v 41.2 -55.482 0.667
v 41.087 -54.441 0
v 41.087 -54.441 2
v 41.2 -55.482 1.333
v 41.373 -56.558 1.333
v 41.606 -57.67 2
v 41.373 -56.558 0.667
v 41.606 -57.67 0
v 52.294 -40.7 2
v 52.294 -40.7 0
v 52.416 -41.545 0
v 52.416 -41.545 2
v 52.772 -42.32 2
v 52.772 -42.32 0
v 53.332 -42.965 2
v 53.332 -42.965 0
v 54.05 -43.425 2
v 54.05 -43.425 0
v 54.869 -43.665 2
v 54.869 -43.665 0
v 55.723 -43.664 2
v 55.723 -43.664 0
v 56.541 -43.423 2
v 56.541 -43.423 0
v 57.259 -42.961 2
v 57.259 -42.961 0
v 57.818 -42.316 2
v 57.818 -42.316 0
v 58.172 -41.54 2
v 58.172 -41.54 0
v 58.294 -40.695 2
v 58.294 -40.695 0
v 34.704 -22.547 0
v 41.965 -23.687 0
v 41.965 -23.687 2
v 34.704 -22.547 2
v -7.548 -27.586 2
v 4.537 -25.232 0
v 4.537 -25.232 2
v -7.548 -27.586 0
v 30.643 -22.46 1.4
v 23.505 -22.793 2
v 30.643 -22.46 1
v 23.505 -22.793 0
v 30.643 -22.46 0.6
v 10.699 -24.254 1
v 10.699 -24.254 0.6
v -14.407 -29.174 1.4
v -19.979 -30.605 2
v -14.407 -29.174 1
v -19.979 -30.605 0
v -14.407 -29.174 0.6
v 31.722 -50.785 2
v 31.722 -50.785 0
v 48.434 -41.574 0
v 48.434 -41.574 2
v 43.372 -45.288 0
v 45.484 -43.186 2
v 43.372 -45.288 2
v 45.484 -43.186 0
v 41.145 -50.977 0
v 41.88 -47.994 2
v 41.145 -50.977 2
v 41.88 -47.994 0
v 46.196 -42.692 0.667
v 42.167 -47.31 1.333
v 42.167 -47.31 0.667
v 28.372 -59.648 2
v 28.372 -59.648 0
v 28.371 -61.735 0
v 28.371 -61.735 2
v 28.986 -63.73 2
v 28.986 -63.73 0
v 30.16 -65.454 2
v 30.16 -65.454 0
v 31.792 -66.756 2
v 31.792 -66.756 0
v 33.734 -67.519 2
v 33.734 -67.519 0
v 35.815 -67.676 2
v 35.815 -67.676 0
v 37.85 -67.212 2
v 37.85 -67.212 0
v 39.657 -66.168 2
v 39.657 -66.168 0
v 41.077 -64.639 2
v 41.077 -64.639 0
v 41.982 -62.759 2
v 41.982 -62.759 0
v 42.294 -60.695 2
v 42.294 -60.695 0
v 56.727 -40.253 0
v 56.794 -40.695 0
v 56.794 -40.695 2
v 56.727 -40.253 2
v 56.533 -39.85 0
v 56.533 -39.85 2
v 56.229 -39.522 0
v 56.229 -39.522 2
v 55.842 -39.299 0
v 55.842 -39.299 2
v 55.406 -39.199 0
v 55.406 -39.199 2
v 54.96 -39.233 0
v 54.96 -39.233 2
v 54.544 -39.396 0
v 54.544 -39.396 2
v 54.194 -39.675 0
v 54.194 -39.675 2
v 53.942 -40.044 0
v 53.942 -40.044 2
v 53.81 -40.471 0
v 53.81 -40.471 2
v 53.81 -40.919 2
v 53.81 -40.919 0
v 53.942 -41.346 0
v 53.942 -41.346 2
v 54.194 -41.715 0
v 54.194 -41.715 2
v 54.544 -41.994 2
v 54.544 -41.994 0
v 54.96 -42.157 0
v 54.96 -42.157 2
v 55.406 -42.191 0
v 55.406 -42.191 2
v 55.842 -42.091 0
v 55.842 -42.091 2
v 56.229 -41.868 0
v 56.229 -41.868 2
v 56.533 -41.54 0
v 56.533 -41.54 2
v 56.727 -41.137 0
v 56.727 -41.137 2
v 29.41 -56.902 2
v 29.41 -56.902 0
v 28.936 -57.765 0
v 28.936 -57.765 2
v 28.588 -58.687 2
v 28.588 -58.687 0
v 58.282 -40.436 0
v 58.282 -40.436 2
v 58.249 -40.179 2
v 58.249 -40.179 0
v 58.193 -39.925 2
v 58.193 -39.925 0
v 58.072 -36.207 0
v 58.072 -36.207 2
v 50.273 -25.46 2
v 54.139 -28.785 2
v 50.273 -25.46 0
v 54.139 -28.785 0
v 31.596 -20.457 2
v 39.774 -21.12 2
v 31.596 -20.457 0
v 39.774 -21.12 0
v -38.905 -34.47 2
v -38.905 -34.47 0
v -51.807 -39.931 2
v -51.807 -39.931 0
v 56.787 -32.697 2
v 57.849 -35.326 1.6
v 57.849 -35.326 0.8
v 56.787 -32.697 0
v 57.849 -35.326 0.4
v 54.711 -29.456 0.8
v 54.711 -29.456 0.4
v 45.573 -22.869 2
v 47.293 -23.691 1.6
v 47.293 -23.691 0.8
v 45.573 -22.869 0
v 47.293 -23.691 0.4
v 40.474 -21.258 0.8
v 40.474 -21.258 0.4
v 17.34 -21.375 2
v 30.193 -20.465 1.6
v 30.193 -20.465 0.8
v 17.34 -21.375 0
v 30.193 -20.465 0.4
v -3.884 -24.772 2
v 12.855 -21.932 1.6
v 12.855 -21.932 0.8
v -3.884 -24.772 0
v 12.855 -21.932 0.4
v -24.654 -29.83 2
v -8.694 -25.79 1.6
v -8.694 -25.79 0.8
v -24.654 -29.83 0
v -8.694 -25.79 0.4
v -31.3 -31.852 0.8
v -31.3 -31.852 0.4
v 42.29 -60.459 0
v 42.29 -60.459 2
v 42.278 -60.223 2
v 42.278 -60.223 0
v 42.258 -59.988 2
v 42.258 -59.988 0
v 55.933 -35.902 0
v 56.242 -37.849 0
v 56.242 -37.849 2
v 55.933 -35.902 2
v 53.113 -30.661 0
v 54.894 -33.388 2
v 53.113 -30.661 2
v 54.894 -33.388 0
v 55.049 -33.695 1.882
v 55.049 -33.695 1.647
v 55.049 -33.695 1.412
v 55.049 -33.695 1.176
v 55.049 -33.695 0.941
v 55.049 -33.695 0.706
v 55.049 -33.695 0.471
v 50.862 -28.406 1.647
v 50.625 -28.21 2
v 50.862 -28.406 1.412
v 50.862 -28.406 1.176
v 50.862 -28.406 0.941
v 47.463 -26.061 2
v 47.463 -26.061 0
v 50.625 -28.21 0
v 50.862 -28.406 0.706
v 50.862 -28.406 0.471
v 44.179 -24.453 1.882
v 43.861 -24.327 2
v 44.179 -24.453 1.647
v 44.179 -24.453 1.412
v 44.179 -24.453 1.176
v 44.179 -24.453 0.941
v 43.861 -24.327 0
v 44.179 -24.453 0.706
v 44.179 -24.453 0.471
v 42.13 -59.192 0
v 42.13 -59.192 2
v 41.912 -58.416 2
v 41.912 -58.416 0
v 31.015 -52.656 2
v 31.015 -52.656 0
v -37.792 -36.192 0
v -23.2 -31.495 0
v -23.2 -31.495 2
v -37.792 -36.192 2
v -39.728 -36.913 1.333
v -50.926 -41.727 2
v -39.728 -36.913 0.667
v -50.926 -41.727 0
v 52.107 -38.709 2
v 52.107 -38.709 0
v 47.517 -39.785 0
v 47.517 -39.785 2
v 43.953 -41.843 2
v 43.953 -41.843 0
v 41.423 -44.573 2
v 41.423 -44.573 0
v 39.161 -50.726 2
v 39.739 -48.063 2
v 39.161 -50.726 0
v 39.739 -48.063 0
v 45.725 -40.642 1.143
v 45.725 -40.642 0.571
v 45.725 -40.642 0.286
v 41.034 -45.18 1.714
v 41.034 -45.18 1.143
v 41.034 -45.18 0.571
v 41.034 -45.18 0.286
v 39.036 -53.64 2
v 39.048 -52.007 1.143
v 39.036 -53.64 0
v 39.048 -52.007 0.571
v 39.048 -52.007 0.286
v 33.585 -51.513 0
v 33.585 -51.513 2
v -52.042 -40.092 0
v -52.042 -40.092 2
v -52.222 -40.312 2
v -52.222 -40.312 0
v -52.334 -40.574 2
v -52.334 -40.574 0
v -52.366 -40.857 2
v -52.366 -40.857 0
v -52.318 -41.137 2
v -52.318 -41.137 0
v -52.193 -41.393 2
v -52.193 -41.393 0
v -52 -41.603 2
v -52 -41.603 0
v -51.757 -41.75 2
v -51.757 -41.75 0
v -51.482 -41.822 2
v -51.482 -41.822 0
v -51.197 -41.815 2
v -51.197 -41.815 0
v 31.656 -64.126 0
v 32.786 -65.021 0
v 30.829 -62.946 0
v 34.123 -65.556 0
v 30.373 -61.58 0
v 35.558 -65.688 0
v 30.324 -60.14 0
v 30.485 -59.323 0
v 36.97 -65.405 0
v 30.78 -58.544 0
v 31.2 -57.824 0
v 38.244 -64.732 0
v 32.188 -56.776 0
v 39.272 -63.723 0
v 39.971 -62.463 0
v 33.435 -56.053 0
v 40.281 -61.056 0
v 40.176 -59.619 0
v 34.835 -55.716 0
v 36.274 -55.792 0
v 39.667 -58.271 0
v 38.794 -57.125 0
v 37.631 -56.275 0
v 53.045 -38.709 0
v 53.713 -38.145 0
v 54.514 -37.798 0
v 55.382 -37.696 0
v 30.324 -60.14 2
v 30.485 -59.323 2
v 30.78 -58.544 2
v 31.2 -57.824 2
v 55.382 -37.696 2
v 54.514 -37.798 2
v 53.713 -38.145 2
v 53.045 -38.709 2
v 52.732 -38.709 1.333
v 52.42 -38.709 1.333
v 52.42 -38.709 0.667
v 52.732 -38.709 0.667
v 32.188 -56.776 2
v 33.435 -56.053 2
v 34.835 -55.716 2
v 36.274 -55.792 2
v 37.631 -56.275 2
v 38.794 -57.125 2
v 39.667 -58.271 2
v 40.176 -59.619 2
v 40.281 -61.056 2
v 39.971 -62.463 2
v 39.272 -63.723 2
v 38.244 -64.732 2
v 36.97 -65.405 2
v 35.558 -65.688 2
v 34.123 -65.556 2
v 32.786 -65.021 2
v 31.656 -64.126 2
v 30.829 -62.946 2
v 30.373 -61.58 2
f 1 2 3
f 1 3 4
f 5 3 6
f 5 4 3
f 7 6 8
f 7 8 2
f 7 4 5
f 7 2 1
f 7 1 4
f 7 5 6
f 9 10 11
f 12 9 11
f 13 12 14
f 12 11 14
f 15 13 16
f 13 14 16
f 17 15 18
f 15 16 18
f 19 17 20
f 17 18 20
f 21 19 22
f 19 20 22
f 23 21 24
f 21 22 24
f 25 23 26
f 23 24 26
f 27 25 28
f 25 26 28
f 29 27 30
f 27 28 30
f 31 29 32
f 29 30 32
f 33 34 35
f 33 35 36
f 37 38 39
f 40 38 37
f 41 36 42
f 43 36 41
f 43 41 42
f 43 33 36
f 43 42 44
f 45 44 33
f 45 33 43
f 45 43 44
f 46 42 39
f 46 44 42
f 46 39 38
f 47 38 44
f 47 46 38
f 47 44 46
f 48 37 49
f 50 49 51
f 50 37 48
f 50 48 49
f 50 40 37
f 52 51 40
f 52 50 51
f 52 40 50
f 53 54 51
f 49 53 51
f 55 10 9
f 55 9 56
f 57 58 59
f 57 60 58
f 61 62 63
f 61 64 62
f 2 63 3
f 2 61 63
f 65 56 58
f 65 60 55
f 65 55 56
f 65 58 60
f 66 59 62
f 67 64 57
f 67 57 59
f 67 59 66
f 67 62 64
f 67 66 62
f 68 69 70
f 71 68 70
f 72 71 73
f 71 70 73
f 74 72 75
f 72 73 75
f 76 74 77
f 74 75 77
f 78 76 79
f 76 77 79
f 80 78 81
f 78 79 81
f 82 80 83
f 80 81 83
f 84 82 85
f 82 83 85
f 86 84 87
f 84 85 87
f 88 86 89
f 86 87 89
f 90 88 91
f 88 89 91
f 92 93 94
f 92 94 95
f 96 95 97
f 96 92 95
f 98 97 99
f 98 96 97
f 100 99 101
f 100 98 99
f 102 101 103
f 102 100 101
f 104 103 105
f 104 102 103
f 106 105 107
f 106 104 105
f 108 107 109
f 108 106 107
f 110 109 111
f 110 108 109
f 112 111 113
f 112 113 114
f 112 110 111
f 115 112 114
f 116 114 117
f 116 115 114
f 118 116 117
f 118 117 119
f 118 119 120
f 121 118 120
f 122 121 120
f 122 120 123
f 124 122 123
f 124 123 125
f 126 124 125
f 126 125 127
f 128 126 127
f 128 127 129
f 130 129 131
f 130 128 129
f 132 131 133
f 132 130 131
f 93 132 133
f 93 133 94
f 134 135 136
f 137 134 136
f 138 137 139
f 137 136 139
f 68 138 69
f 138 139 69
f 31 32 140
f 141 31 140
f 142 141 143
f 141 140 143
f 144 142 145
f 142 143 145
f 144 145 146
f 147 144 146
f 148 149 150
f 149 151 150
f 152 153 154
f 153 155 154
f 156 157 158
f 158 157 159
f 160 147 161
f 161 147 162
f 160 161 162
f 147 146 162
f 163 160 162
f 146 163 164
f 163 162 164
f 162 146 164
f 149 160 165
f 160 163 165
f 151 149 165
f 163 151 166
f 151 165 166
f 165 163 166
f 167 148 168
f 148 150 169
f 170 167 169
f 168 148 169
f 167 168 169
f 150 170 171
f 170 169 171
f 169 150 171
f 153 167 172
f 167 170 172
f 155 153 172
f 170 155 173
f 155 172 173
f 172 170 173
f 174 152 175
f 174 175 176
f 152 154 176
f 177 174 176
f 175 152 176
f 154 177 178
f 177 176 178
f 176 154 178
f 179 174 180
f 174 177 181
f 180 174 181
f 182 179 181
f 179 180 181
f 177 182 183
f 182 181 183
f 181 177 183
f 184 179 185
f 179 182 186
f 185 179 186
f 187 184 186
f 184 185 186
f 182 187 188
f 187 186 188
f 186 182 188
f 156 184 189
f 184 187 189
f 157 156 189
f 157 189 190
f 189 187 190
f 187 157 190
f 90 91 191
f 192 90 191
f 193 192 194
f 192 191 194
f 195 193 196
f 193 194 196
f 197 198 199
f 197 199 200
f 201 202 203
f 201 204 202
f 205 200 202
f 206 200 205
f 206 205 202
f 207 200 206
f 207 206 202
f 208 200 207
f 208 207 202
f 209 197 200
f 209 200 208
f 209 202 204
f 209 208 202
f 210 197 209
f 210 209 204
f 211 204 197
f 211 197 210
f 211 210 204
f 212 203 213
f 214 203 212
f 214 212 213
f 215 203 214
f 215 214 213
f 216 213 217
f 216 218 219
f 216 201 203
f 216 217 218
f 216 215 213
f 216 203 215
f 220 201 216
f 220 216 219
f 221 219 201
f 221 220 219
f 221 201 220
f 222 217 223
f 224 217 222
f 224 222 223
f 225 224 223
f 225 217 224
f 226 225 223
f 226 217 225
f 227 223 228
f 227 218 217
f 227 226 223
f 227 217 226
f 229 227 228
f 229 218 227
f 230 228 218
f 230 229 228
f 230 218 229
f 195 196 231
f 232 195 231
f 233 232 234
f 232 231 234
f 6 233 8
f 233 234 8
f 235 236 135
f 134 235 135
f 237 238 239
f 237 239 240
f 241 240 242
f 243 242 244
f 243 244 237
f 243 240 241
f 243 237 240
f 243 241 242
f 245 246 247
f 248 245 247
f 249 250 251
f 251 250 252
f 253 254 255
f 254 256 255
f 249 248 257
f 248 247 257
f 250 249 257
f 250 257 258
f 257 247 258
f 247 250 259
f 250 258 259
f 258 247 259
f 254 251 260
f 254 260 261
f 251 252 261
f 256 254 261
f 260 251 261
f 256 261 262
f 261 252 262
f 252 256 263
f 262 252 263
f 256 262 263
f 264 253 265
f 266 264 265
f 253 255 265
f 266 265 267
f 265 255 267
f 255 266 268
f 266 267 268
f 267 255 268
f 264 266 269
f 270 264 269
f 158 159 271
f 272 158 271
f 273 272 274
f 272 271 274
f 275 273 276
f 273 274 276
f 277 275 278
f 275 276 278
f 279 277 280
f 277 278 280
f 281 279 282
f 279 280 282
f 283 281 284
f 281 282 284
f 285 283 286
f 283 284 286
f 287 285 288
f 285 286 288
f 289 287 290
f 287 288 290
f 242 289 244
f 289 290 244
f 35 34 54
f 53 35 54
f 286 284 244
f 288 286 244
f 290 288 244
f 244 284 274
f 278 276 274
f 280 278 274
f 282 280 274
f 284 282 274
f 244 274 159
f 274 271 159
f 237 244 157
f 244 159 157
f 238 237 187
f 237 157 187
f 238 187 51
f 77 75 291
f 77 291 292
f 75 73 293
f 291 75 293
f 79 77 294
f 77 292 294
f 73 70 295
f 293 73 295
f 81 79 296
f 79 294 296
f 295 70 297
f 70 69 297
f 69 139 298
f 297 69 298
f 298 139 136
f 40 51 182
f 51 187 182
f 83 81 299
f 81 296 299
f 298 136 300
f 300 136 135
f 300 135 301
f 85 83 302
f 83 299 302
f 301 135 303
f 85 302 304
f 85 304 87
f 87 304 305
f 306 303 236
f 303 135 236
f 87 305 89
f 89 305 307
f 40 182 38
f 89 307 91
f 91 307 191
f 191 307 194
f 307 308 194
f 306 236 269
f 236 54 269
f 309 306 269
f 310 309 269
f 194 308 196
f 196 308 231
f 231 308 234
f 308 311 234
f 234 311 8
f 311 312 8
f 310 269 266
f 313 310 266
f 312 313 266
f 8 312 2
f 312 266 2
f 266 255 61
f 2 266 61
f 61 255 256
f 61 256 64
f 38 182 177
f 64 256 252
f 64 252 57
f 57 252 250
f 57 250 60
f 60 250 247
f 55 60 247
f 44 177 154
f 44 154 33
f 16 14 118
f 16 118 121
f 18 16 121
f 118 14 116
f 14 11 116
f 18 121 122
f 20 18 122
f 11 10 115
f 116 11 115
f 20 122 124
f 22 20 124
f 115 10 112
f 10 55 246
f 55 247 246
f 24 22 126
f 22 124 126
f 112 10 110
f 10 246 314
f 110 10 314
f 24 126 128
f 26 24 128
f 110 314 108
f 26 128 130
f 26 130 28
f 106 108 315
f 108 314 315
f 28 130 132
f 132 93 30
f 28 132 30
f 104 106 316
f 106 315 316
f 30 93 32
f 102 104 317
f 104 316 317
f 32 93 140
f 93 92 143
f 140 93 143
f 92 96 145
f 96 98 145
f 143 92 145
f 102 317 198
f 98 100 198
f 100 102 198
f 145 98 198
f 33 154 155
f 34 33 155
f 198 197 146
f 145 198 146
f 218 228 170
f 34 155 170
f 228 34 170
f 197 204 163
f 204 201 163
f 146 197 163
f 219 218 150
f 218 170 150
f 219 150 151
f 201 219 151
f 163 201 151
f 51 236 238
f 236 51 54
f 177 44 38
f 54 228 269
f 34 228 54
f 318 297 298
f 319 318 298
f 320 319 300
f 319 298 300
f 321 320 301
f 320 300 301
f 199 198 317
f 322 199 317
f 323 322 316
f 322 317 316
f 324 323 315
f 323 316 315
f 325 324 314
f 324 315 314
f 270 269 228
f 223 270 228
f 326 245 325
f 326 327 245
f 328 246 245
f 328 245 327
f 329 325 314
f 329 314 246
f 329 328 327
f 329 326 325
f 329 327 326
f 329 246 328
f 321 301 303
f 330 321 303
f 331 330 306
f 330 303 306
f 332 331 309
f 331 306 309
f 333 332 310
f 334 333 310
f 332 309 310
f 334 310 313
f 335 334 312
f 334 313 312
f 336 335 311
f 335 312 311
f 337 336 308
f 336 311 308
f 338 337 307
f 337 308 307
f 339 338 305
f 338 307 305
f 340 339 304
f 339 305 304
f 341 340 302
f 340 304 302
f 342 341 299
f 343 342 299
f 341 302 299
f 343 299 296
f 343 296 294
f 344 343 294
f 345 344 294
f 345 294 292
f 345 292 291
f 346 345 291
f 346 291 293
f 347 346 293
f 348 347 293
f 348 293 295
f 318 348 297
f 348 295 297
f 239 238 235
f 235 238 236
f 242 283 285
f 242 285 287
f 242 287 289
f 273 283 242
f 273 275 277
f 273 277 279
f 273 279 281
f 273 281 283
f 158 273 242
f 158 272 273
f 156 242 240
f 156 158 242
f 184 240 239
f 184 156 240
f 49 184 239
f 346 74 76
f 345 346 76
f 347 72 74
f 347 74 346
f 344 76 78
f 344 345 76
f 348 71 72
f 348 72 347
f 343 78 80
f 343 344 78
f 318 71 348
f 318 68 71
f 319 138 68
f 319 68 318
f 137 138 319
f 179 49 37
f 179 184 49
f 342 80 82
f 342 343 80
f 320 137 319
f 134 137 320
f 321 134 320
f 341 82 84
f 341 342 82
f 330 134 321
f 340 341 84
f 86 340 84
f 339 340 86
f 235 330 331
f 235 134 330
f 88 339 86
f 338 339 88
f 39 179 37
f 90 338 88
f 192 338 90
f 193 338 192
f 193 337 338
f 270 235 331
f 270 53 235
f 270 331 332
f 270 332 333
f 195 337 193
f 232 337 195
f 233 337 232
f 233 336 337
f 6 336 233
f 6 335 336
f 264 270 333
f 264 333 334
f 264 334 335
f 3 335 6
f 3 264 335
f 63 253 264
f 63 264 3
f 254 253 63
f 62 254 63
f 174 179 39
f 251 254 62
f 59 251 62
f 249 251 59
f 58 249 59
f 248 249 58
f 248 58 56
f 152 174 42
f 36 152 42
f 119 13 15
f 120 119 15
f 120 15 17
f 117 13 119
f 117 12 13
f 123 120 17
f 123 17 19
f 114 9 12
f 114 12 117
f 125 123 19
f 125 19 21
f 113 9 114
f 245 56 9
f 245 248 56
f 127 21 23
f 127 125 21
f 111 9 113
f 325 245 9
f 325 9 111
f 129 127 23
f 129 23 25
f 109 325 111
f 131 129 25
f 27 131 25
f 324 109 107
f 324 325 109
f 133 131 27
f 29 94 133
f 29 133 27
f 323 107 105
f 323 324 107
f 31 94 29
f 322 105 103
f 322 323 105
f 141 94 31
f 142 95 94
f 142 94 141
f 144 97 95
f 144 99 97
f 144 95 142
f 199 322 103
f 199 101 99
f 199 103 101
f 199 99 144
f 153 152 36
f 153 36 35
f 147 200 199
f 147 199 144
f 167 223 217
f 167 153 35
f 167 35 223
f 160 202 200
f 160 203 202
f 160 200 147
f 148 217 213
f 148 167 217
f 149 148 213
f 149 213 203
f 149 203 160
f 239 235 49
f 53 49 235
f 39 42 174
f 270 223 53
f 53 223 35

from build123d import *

# Parameters (mm, degrees)
F0_R     = 1.5
F1_DEPTH = 2


# Not quite as in the source:
# - ends of sketch curves that miss each other by under 0.0002 mm in the source are joined
# - the dataset's text gives a spline's control points without its knots; the knots are read off the source's solid
# - a feature names something its author has since deleted; it is built from what else it names


with BuildPart() as f1:
    # F0 (on Top) → F1 (new body)
    with BuildSketch(Plane.XY):
        with BuildLine():
            ThreePointArc((52.2935542038, -40.6999699993), (55.2960408024, -43.6949874982), (58.293550068, -40.6949885322))
            ThreePointArc((58.293550068, -40.6949885322), (58.2683262446, -40.3067789254), (58.1930789354, -39.9250974055))
            ThreePointArc((58.1930789354, -39.9250974055), (57.4796767246, -38.6405177387), (56.2418257324, -37.8488027926))
            ThreePointArc((56.2418257324, -37.8488027926), (54.5142276657, -37.797980318), (53.0452934588, -38.7086999783))
            ThreePointArc((53.0452934588, -38.7086999783), (52.4868923439, -39.6354261603), (52.2935542038, -40.6999699993))
        make_face()
        with Locations((55.293550068, -40.6949885322)):
            Circle(F0_R, mode=Mode.SUBTRACT)
        with BuildLine():
            ThreePointArc((56.2418257324, -37.8488027926), (57.4796767246, -38.6405177387), (58.1930789354, -39.9250974055))
            add(Edge.make_bspline(
                [(58.1930789354, -39.9250974055), (58.3033130736, -37.7310082657), (58.2243494159, -35.5108400169), (55.0379759914, -28.7548025201), (48.9442417419, -24.2694887803), (44.3900033027, -22.3203597806), (42.6738912189, -21.8107824439)],
                knots=[0, 0, 0, 0, 0.1015612411, 0.2235800295, 0.3685390699, 0.4388199083, 0.4388199083, 0.4388199083, 0.4388199083], degree=3))
            Line((42.6738912189, -21.8107824439), (41.964733286, -23.686983414))
            add(Edge.make_bspline(
                [(43.8609833986, -24.3268333981), (43.3289424335, -24.1211020721), (42.7047021585, -23.9054209924), (42.0415249398, -23.7092758985), (41.964733286, -23.686983414)],
                knots=[0.4114771922, 0.4114771922, 0.4114771922, 0.4114771922, 0.4375, 0.4408809882, 0.4408809882, 0.4408809882, 0.4408809882], degree=3))
            add(Edge.make_bspline(
                [(56.2418257324, -37.8488027926), (56.2394213733, -37.7603227769), (56.2286503864, -37.4873658698), (56.1800365415, -36.9201590877), (56.069742607, -36.3538850938), (55.8543969217, -35.6321786342), (55.5678897973, -34.8258093362), (55.0817648726, -33.7070238451), (54.3034301535, -32.2914370705), (53.5048198591, -31.1313333662), (52.7839346376, -30.2592295206), (51.9942866252, -29.4080883353), (50.8900875481, -28.3917840446), (49.39835744, -27.2551920717), (48.0378091306, -26.3838599758), (46.892639081, -25.7358249791), (45.7132806304, -25.1200272482), (44.7078870744, -24.6607216085), (43.9678542796, -24.368158577), (43.8609833986, -24.3268333981)],
                knots=[0.0398594843, 0.0398594843, 0.0398594843, 0.0398594843, 0.046875, 0.0625, 0.09375, 0.109375, 0.125, 0.15625, 0.1875, 0.21875, 0.234375, 0.25, 0.28125, 0.3125, 0.34375, 0.359375, 0.375, 0.40625, 0.4114771922, 0.4114771922, 0.4114771922, 0.4114771922], degree=3))
        make_face()
        with BuildLine():
            add(Edge.make_bspline(
                [(52.2935542038, -40.6999699993), (45.456263492, -41.3409080355), (40.3978308424, -46.0921366862), (41.0869357168, -54.4406835786)],
                knots=[0, 0, 0, 0, 18.0622051912, 18.0622051912, 18.0622051912, 18.0622051912], degree=3))
            ThreePointArc((52.2935542038, -40.6999699993), (52.4868923439, -39.6354261603), (53.0452934588, -38.7086999783))
            add(Edge.make_bspline(
                [(52.1068895218, -38.7086999783), (52.4196908341, -38.7086999783), (52.7324921465, -38.7086999783), (53.0452934588, -38.7086999783)],
                knots=[0, 0, 0, 0, 0.938403937, 0.938403937, 0.938403937, 0.938403937], degree=3))
            add(Edge.make_bspline(
                [(52.1068895218, -38.7086999783), (50.9542029326, -38.8167545733), (48.7166922252, -39.2432467553), (45.656251664, -40.5314133508), (43.0085385627, -42.4829452683), (40.9177950005, -45.0828169643), (39.5222111221, -48.2640140254), (39.0301599925, -51.2150541571), (39.0166820966, -53.0841597893), (39.0364706431, -53.640353514)],
                knots=[0, 0, 0, 0, 0.125, 0.25, 0.375, 0.5, 0.625, 0.75, 0.8013710099, 0.8013710099, 0.8013710099, 0.8013710099], degree=3))
            Line((39.0364706431, -53.640353514), (41.0869357168, -54.4406835786))
        make_face()
        with BuildLine():
            Line((41.964733286, -23.686983414), (42.6738912189, -21.8107824439))
            add(Edge.make_bspline(
                [(42.6738912189, -21.8107824439), (39.5726178708, -20.8898993454), (22.5646670262, -18.6515577464), (-27.2658854571, -27.8972020005), (-51.8069210646, -39.9311738866)],
                knots=[0.4388199083, 0.4388199083, 0.4388199083, 0.4388199083, 0.5658279827, 1, 1, 1, 1], degree=3))
            ThreePointArc((-51.8069210646, -39.9311738866), (-52.2645064284, -41.2693127564), (-50.9263675587, -41.7268981202))
            add(Edge.make_bspline(
                [(-23.2001931383, -31.4948417187), (-24.5902934046, -31.8889224129), (-30.2586462024, -33.5514164099), (-39.9245924887, -36.8107053488), (-47.460158402, -40.0272036082), (-50.9263675587, -41.7268981202)],
                knots=[0.8548139109, 0.8548139109, 0.8548139109, 0.8548139109, 0.875, 0.9375, 1, 1, 1, 1], degree=3))
            add(Edge.make_bspline(
                [(-19.9786029715, -30.6053536552), (-21.0551466867, -30.8947880406), (-22.1295355043, -31.1913200851), (-23.2001931383, -31.4948417187)],
                knots=[0.8392665501, 0.8392665501, 0.8392665501, 0.8392665501, 0.8548139109, 0.8548139109, 0.8548139109, 0.8548139109], degree=3))
            add(Edge.make_bspline(
                [(41.964733286, -23.686983414), (41.3317504553, -23.503229591), (39.9116827451, -23.1510783719), (37.4071483832, -22.746096553), (34.3488873951, -22.4920963849), (30.7487168375, -22.424981715), (26.5130652723, -22.5659356176), (20.1107293403, -23.0314333909), (10.9126678715, -24.1239147624), (-1.4091965396, -26.2175832368), (-11.9228386138, -28.5154051855), (-18.1252105086, -30.1070594376), (-19.9786029715, -30.6053536552)],
                knots=[0.4408809882, 0.4408809882, 0.4408809882, 0.4408809882, 0.46875, 0.5, 0.53125, 0.5625, 0.59375, 0.625, 0.6875, 0.75, 0.8125, 0.8392665501, 0.8392665501, 0.8392665501, 0.8392665501], degree=3))
        make_face()
        with BuildLine():
            add(Edge.make_bspline(
                [(41.0869357168, -54.4406835786), (41.171365149, -55.4635512139), (41.3420723504, -56.5404191219), (41.6063564607, -57.670343851)],
                knots=[18.0622051912, 18.0622051912, 18.0622051912, 18.0622051912, 20.2751945115, 20.2751945115, 20.2751945115, 20.2751945115], degree=3))
            Line((41.0869357168, -54.4406835786), (39.0364758665, -53.6403401319))
            Line((39.0364758665, -53.6403401319), (33.5854085722, -51.5126583899))
            Line((33.5854085722, -51.5126583899), (32.8782428587, -53.383588596))
            Line((32.8782428587, -53.383588596), (33.9898275109, -53.8174666315))
            ThreePointArc((33.9898275109, -53.8174666315), (38.453280426, -54.4487013098), (41.6063564607, -57.670343851))
        make_face()
        with BuildLine():
            Line((33.5854085722, -51.5126583899), (43.8609833986, -24.3268333981))
            add(Edge.make_bspline(
                [(43.8609833986, -24.3268333981), (43.3289424335, -24.1211020721), (42.7047021585, -23.9054209924), (42.0415249398, -23.7092758985), (41.964733286, -23.686983414)],
                knots=[0.4114771922, 0.4114771922, 0.4114771922, 0.4114771922, 0.4375, 0.4408809882, 0.4408809882, 0.4408809882, 0.4408809882], degree=3))
            Line((41.964733286, -23.686983414), (31.7221959356, -50.7854020024))
            Line((31.7221959356, -50.7854020024), (33.5854085722, -51.5126583899))
        make_face()
        with BuildLine():
            ThreePointArc((42.257771215, -59.9881478041), (42.032460875, -58.8010294155), (41.6063564607, -57.670343851))
            add(Edge.make_bspline(
                [(41.6063564607, -57.670343851), (41.7816276486, -58.4197012349), (41.9980562098, -59.1923942837), (42.257771215, -59.9881478041)],
                knots=[20.2751945115, 20.2751945115, 20.2751945115, 20.2751945115, 21.7428319964, 21.7428319964, 21.7428319964, 21.7428319964], degree=3))
        make_face()
        with BuildLine():
            add(Edge.make_bspline(
                [(41.6063564607, -57.670343851), (41.7816276486, -58.4197012349), (41.9980562098, -59.1923942837), (42.257771215, -59.9881478041)],
                knots=[20.2751945115, 20.2751945115, 20.2751945115, 20.2751945115, 21.7428319964, 21.7428319964, 21.7428319964, 21.7428319964], degree=3))
            ThreePointArc((41.6063564607, -57.670343851), (38.453280426, -54.4487013098), (33.9898275109, -53.8174666315))
            ThreePointArc((33.9898275109, -53.8174666315), (33.2574115394, -53.9976651943), (32.5486357461, -54.2556216871))
            ThreePointArc((32.5486357461, -54.2556216871), (30.7811233168, -55.3435396802), (29.4103052988, -56.9019118146))
            Line((29.4103052988, -56.9019118146), (28.3722521988, -59.6482622997))
            ThreePointArc((28.3722521988, -59.6482622997), (34.7687096562, -67.6752852696), (42.293550068, -60.6949885322))
            ThreePointArc((42.293550068, -60.6949885322), (42.2845996326, -60.3411156944), (42.257771215, -59.9881478041))
        make_face()
        with BuildLine():
            ThreePointArc((31.1997706158, -57.824279596), (36.7987249314, -55.9269230303), (40.293550068, -60.6949885322))
            ThreePointArc((40.293550068, -60.6949885322), (35.0156984919, -65.6872624131), (30.3244306673, -60.1401440657))
            ThreePointArc((30.3244306673, -60.1401440657), (30.6164953361, -58.9271765979), (31.1997706158, -57.824279596))
        make_face(mode=Mode.SUBTRACT)
        Polygon((32.8782428587, -53.383588596), (33.5854085722, -51.5126583899), (31.7221959356, -50.7854020024), (31.015030222, -52.6563322085), align=None)
        with BuildLine():
            Line((31.015030222, -52.6563322085), (31.7221959356, -50.7854020024))
            Line((31.7221959356, -50.7854020024), (-19.9786054149, -30.6053445671))
            add(Edge.make_bspline(
                [(-19.9786054149, -30.6053445671), (-21.0551466867, -30.8947880406), (-22.1295355043, -31.1913200851), (-23.2001931383, -31.4948417187)],
                knots=[0.8392665501, 0.8392665501, 0.8392665501, 0.8392665501, 0.8548139109, 0.8548139109, 0.8548139109, 0.8548139109], degree=3))
            Line((-23.2001931383, -31.4948417187), (31.015030222, -52.6563322085))
        make_face()
        with BuildLine():
            ThreePointArc((32.5486357461, -54.2556216871), (33.2574115394, -53.9976651943), (33.9898275109, -53.8174666315))
            Line((33.9898275109, -53.8174666315), (32.8782428587, -53.383588596))
            Line((32.8782428587, -53.383588596), (32.5486357461, -54.2556216871))
        make_face()
        with BuildLine():
            Line((32.5486357461, -54.2556216871), (32.8782428587, -53.383588596))
            Line((32.8782428587, -53.383588596), (31.015030222, -52.6563322085))
            Line((31.015030222, -52.6563322085), (29.4103052988, -56.9019118146))
            ThreePointArc((29.4103052988, -56.9019118146), (30.7811233168, -55.3435396802), (32.5486357461, -54.2556216871))
        make_face()
        with BuildLine():
            Line((28.3722521988, -59.6482622997), (29.4103052988, -56.9019118146))
            ThreePointArc((29.4103052988, -56.9019118146), (28.7456734434, -58.2200518242), (28.3722521988, -59.6482622997))
        make_face()
    extrude(amount=F1_DEPTH)


solid = f1.part
